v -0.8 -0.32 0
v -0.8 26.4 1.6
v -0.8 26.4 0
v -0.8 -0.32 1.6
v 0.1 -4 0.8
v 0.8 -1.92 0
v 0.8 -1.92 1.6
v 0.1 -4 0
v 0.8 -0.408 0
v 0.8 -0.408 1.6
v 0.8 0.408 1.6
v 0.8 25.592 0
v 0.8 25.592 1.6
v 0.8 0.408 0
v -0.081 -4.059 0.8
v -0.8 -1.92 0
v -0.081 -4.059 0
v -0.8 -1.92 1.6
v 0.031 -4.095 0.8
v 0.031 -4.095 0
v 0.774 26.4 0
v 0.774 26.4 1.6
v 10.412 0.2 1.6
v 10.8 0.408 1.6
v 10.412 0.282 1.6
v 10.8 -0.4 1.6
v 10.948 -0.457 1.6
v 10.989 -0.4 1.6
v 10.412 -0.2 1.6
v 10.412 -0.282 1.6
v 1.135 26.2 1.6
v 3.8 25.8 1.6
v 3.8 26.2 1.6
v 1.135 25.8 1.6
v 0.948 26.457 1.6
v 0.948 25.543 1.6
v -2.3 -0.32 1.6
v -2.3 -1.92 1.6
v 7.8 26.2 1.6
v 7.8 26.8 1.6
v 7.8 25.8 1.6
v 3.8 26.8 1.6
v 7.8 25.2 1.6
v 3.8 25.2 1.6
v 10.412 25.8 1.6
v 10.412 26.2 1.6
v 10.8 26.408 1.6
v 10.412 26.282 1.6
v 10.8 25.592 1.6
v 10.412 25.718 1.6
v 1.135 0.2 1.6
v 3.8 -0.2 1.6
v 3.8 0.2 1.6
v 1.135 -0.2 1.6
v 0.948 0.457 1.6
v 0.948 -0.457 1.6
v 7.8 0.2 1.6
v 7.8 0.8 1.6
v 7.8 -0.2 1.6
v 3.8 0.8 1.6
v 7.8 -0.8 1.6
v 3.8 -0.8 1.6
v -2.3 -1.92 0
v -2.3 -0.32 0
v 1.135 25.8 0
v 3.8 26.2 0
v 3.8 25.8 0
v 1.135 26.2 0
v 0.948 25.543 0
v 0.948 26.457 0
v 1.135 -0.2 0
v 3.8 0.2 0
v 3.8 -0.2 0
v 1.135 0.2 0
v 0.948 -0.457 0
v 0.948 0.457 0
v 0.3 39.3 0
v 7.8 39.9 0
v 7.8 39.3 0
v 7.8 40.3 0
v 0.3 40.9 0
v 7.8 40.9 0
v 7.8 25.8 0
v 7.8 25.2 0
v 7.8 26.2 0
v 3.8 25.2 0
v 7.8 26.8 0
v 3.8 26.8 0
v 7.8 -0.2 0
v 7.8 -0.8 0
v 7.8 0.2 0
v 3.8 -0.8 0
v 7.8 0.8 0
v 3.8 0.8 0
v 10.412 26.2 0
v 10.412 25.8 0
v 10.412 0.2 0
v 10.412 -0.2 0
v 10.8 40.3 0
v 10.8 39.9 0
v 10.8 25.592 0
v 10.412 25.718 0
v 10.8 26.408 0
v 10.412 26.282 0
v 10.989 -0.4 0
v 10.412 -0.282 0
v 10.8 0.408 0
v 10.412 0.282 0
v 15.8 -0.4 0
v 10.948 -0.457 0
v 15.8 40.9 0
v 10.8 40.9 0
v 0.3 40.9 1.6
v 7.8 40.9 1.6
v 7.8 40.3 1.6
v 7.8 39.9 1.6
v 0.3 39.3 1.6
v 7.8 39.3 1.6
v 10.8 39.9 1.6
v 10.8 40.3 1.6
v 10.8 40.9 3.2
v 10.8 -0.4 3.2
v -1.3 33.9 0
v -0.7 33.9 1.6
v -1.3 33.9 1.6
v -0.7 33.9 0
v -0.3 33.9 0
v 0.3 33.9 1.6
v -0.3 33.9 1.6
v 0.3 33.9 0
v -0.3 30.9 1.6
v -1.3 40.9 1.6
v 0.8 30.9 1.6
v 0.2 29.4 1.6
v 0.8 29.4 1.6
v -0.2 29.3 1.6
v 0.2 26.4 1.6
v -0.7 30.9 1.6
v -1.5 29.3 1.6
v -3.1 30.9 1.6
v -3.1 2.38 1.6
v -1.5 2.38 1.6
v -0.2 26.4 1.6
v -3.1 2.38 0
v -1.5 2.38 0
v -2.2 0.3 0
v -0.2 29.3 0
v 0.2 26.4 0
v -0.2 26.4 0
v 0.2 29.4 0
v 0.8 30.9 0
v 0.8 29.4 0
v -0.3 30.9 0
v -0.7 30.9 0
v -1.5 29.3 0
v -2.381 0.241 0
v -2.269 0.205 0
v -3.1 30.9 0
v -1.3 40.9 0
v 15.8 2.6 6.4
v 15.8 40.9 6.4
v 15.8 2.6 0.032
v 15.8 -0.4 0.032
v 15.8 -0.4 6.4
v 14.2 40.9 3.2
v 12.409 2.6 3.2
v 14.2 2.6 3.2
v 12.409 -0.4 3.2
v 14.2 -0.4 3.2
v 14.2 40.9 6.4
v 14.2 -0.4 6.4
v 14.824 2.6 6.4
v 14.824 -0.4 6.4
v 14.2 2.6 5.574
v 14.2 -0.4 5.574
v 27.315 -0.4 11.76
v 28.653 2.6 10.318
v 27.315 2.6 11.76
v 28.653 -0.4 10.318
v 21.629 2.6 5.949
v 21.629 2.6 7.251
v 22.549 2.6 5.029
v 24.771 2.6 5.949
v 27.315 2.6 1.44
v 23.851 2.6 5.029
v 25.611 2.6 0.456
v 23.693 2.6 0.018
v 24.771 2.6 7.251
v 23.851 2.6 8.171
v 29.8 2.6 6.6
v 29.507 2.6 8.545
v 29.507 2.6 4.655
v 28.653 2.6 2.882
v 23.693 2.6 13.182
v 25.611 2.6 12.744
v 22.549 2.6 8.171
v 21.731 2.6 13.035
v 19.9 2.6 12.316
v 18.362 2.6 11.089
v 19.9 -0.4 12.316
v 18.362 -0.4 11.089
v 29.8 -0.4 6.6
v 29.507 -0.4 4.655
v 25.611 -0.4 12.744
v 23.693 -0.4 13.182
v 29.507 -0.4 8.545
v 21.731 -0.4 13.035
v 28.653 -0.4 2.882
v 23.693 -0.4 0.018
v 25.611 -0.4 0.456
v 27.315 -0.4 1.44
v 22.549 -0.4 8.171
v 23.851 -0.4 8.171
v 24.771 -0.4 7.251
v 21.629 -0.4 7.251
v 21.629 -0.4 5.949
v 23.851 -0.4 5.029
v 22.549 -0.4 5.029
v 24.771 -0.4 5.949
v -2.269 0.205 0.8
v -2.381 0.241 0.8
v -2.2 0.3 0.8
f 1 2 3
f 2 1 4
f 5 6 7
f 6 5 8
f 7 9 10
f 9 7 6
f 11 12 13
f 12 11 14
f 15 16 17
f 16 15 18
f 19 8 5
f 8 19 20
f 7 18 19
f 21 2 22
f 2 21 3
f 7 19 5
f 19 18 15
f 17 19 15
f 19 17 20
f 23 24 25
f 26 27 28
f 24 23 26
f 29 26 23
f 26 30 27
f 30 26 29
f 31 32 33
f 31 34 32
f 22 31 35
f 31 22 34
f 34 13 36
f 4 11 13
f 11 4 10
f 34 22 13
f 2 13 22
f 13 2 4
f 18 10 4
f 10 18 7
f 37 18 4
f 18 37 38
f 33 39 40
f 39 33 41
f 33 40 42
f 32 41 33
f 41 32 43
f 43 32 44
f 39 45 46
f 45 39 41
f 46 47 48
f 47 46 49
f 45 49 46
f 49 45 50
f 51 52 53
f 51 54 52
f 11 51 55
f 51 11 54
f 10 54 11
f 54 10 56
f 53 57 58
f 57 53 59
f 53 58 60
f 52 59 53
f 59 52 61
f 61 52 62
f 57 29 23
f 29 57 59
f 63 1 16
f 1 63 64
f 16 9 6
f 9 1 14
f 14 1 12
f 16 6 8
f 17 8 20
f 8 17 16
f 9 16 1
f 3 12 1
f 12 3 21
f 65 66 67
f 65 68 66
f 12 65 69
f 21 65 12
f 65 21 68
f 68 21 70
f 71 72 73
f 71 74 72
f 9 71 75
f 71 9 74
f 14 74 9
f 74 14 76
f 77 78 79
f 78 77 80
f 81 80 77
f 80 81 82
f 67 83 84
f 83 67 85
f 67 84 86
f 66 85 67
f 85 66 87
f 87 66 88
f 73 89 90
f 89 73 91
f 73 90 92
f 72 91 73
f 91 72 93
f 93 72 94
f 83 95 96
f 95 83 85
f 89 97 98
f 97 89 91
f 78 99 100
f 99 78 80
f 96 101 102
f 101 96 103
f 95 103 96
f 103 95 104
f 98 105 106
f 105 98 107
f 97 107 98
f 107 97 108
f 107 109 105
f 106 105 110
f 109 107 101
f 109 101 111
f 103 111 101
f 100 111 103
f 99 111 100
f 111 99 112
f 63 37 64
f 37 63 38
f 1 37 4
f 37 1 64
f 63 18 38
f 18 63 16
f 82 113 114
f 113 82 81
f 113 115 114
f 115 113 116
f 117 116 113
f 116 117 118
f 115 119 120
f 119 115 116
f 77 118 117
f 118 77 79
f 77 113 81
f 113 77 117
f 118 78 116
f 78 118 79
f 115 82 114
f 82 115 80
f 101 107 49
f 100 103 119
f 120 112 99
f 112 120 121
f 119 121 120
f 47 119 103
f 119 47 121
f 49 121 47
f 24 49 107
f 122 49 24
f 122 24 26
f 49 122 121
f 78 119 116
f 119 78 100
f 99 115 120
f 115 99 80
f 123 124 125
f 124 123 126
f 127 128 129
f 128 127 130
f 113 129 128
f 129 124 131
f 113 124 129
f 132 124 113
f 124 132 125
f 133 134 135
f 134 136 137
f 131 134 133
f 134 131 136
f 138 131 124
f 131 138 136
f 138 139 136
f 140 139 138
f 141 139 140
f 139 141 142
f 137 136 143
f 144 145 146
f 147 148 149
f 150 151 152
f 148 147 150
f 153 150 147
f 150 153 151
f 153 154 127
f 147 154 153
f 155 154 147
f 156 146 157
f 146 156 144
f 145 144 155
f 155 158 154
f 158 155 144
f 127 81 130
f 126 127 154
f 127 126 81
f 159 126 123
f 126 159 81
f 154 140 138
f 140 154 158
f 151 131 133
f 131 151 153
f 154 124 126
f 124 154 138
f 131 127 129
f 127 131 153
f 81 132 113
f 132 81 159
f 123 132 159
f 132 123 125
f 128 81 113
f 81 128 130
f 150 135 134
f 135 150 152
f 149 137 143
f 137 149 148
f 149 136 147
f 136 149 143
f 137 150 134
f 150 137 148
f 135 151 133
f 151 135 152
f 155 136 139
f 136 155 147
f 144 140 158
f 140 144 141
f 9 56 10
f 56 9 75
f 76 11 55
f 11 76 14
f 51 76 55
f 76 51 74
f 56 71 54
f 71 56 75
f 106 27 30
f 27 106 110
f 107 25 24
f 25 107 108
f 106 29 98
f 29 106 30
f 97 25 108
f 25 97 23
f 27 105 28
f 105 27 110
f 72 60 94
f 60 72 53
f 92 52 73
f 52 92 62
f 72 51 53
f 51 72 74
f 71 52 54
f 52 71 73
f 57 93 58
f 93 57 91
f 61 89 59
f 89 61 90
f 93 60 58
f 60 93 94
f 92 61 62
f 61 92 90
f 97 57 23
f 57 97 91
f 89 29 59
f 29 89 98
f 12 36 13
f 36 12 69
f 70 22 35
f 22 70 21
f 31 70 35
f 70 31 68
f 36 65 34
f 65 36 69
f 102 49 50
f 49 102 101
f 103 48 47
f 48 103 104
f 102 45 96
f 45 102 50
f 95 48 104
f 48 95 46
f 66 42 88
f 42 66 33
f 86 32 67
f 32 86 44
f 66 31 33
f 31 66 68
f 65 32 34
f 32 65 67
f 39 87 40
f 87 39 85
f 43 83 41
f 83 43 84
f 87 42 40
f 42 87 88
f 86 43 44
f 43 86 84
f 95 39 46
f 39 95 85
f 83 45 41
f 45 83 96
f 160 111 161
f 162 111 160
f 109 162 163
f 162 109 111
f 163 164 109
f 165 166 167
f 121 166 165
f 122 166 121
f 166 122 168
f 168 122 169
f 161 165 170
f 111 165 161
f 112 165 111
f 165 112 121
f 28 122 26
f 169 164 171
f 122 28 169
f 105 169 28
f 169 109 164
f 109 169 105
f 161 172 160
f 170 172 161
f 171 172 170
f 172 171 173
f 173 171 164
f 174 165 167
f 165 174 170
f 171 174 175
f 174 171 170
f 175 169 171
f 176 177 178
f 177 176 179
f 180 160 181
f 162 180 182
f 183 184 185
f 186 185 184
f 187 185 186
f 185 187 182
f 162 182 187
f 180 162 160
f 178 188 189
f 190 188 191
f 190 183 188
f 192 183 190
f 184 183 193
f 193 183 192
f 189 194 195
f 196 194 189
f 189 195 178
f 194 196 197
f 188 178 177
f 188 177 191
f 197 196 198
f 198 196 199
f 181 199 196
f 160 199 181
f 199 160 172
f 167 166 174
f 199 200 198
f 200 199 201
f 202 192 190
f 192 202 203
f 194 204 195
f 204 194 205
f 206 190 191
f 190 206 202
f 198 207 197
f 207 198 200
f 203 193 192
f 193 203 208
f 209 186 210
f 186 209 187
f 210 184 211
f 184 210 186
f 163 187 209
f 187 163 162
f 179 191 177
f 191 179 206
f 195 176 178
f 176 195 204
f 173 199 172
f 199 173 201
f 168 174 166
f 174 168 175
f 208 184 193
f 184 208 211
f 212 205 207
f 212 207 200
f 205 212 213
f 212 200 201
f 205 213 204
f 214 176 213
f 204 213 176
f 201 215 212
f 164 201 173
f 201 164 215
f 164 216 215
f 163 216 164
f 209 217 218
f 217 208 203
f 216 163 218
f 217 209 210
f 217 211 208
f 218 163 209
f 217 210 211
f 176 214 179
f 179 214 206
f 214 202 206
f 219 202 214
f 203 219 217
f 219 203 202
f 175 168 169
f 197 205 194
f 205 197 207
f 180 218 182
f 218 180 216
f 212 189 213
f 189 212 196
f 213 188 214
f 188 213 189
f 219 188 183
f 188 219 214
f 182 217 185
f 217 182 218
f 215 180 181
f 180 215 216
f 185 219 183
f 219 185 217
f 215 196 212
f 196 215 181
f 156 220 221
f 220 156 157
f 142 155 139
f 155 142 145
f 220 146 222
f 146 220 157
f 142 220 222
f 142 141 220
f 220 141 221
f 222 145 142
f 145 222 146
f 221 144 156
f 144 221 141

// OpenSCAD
// pika_touch_probe.scad - Combined Scott-Russell flexure touch inidicator and probe tip holder
// (C)2026 vik@diamondage.co.nz GPLv3 or later applies

flexure_thick=0.4;
flexure_length=3;
body_height=1.6;
small_gap=0.1;      // Smallest gap we can reliably print

probe_length=4;
probe_width=1.6;
probe_hinge_length=10;
probe_hinge_sep=26;
point_length=probe_width*1.3;
hinge_width=1.6;

first_joint_length=7.5;
first_joint_offset=0.5;
flag_clearance=1.5;
l_arm_length=10;

handle_depth=5;    // Handle sticks out this much.
// The flag goes down to meet a protrusion stickign out just before the probe point
flag_length=probe_length+probe_hinge_sep-hinge_width/2-small_gap;

tab_rad=10/2+body_height;
tab_thick=3;
screw_rad=3.4/2;
tab_extends=tab_rad+1;

module flat_flexure() {
    translate([0,-flexure_thick/2,0])
        cube([flexure_length,flexure_thick,body_height]);
}

module probe_hinge() {
    // Blobs to encourage printer to join the flexure to things
    cylinder(h=body_height,r=flexure_thick*1.2);
    translate([probe_hinge_length,0,0]) cylinder(h=body_height,r=flexure_thick*1.2);
    flat_flexure();
    translate([flexure_length,-hinge_width/2,0])
        cube([probe_hinge_length-2*flexure_length,hinge_width,body_height]);
    translate([probe_hinge_length-flexure_length,0,0]) flat_flexure();
}

l_base_arm_length=probe_hinge_length+first_joint_offset;
module l_arm() {
    flat_flexure();
    translate([flexure_length,-hinge_width/2,0])
        cube([l_arm_length-flexure_length,hinge_width,body_height]);
    translate([l_arm_length-hinge_width,flexure_length-probe_hinge_length-first_joint_offset-hinge_width/2,0]) {
        cube([hinge_width,probe_hinge_length+first_joint_offset-flexure_length,body_height]);
        translate([hinge_width/2,0,0]) rotate([0,0,-90]) flat_flexure();
    }
}

// The first joint in the Stewart Russel flexure
stub_location=first_joint_length-hinge_width-flexure_length;
module first_joint() {
    rotate([0,0,90]) {
        flat_flexure();
        // Central pivoting part of Scott-Russel flexure
        translate([flexure_length,-hinge_width/2,0])
            cube([first_joint_length-2*flexure_length,hinge_width,body_height]);
        // L-shaped end hinge
        translate([first_joint_length-flexure_length,first_joint_offset,0]) l_arm();
        // Protruding stub for flag component
        translate([stub_location,0,0])
            cube([hinge_width,flag_clearance+probe_width/2+hinge_width/2,body_height]);
    }
}

// The probe
translate([0,-probe_length,0]) {
    hull() {
        // Pointy end
        cylinder(h=body_height/2,r=0.1);
        // Main arm of probe
        translate([-probe_width/2,point_length,0])
            cube([probe_width,probe_length+probe_hinge_sep+flexure_thick-point_length,body_height]);
    }
    // Sideways protrusion used as alignment scale
    translate([-flag_clearance-hinge_width/2,point_length,0])
        cube([flag_clearance,hinge_width,body_height]);
}

// The flag arm
translate([(-probe_width-hinge_width)/2-flag_clearance,probe_hinge_sep-flag_length+flexure_length+flexure_thick,0])
    hull() {
        // Pointy end
        translate([hinge_width/2,0,0]) cylinder(h=body_height/2,r=0.1);
        translate([0,point_length,0]) cube([hinge_width,flag_length-point_length,body_height]);
    }


// Flexure out front
translate([0,probe_hinge_sep+flexure_thick,0])
        first_joint();
// Two hinge flexuress anchoring the probe to the holder
translate([probe_width/2,0,0]) probe_hinge();
translate([probe_width/2,probe_hinge_sep,0]) probe_hinge();
// The bit that holds on to the flexures
translate([probe_hinge_length+probe_width/2,-flexure_thick,0]) {
    handle_length=probe_hinge_sep+first_joint_length+l_arm_length+2*flexure_thick-flexure_length;
    // Flat part attached to flexures
    cube([handle_depth,handle_length,body_height*2]);
    // Stiffening strip
    translate([handle_depth-body_height,0,0]) cube([body_height,handle_length,body_height*4]);
}
// Tab to attach to probe
translate([probe_hinge_length+hinge_width,tab_thick-flexure_thick,0]) rotate([90,0,0]) difference() {
    hull() {
        // Nice, smooth transition to the handle
        translate([handle_depth+tab_rad,tab_rad,0]) cylinder(h=tab_thick,r=tab_rad);
        translate([0,body_height/2,0]) cylinder(h=tab_thick,r=body_height/2);
    }
    // Perforate for a screw
    translate([handle_depth+tab_rad,tab_rad,0]) rotate([0,0,180/8])
        cylinder(h=tab_thick*3,r=screw_rad,center=true,$fn=8);
}
